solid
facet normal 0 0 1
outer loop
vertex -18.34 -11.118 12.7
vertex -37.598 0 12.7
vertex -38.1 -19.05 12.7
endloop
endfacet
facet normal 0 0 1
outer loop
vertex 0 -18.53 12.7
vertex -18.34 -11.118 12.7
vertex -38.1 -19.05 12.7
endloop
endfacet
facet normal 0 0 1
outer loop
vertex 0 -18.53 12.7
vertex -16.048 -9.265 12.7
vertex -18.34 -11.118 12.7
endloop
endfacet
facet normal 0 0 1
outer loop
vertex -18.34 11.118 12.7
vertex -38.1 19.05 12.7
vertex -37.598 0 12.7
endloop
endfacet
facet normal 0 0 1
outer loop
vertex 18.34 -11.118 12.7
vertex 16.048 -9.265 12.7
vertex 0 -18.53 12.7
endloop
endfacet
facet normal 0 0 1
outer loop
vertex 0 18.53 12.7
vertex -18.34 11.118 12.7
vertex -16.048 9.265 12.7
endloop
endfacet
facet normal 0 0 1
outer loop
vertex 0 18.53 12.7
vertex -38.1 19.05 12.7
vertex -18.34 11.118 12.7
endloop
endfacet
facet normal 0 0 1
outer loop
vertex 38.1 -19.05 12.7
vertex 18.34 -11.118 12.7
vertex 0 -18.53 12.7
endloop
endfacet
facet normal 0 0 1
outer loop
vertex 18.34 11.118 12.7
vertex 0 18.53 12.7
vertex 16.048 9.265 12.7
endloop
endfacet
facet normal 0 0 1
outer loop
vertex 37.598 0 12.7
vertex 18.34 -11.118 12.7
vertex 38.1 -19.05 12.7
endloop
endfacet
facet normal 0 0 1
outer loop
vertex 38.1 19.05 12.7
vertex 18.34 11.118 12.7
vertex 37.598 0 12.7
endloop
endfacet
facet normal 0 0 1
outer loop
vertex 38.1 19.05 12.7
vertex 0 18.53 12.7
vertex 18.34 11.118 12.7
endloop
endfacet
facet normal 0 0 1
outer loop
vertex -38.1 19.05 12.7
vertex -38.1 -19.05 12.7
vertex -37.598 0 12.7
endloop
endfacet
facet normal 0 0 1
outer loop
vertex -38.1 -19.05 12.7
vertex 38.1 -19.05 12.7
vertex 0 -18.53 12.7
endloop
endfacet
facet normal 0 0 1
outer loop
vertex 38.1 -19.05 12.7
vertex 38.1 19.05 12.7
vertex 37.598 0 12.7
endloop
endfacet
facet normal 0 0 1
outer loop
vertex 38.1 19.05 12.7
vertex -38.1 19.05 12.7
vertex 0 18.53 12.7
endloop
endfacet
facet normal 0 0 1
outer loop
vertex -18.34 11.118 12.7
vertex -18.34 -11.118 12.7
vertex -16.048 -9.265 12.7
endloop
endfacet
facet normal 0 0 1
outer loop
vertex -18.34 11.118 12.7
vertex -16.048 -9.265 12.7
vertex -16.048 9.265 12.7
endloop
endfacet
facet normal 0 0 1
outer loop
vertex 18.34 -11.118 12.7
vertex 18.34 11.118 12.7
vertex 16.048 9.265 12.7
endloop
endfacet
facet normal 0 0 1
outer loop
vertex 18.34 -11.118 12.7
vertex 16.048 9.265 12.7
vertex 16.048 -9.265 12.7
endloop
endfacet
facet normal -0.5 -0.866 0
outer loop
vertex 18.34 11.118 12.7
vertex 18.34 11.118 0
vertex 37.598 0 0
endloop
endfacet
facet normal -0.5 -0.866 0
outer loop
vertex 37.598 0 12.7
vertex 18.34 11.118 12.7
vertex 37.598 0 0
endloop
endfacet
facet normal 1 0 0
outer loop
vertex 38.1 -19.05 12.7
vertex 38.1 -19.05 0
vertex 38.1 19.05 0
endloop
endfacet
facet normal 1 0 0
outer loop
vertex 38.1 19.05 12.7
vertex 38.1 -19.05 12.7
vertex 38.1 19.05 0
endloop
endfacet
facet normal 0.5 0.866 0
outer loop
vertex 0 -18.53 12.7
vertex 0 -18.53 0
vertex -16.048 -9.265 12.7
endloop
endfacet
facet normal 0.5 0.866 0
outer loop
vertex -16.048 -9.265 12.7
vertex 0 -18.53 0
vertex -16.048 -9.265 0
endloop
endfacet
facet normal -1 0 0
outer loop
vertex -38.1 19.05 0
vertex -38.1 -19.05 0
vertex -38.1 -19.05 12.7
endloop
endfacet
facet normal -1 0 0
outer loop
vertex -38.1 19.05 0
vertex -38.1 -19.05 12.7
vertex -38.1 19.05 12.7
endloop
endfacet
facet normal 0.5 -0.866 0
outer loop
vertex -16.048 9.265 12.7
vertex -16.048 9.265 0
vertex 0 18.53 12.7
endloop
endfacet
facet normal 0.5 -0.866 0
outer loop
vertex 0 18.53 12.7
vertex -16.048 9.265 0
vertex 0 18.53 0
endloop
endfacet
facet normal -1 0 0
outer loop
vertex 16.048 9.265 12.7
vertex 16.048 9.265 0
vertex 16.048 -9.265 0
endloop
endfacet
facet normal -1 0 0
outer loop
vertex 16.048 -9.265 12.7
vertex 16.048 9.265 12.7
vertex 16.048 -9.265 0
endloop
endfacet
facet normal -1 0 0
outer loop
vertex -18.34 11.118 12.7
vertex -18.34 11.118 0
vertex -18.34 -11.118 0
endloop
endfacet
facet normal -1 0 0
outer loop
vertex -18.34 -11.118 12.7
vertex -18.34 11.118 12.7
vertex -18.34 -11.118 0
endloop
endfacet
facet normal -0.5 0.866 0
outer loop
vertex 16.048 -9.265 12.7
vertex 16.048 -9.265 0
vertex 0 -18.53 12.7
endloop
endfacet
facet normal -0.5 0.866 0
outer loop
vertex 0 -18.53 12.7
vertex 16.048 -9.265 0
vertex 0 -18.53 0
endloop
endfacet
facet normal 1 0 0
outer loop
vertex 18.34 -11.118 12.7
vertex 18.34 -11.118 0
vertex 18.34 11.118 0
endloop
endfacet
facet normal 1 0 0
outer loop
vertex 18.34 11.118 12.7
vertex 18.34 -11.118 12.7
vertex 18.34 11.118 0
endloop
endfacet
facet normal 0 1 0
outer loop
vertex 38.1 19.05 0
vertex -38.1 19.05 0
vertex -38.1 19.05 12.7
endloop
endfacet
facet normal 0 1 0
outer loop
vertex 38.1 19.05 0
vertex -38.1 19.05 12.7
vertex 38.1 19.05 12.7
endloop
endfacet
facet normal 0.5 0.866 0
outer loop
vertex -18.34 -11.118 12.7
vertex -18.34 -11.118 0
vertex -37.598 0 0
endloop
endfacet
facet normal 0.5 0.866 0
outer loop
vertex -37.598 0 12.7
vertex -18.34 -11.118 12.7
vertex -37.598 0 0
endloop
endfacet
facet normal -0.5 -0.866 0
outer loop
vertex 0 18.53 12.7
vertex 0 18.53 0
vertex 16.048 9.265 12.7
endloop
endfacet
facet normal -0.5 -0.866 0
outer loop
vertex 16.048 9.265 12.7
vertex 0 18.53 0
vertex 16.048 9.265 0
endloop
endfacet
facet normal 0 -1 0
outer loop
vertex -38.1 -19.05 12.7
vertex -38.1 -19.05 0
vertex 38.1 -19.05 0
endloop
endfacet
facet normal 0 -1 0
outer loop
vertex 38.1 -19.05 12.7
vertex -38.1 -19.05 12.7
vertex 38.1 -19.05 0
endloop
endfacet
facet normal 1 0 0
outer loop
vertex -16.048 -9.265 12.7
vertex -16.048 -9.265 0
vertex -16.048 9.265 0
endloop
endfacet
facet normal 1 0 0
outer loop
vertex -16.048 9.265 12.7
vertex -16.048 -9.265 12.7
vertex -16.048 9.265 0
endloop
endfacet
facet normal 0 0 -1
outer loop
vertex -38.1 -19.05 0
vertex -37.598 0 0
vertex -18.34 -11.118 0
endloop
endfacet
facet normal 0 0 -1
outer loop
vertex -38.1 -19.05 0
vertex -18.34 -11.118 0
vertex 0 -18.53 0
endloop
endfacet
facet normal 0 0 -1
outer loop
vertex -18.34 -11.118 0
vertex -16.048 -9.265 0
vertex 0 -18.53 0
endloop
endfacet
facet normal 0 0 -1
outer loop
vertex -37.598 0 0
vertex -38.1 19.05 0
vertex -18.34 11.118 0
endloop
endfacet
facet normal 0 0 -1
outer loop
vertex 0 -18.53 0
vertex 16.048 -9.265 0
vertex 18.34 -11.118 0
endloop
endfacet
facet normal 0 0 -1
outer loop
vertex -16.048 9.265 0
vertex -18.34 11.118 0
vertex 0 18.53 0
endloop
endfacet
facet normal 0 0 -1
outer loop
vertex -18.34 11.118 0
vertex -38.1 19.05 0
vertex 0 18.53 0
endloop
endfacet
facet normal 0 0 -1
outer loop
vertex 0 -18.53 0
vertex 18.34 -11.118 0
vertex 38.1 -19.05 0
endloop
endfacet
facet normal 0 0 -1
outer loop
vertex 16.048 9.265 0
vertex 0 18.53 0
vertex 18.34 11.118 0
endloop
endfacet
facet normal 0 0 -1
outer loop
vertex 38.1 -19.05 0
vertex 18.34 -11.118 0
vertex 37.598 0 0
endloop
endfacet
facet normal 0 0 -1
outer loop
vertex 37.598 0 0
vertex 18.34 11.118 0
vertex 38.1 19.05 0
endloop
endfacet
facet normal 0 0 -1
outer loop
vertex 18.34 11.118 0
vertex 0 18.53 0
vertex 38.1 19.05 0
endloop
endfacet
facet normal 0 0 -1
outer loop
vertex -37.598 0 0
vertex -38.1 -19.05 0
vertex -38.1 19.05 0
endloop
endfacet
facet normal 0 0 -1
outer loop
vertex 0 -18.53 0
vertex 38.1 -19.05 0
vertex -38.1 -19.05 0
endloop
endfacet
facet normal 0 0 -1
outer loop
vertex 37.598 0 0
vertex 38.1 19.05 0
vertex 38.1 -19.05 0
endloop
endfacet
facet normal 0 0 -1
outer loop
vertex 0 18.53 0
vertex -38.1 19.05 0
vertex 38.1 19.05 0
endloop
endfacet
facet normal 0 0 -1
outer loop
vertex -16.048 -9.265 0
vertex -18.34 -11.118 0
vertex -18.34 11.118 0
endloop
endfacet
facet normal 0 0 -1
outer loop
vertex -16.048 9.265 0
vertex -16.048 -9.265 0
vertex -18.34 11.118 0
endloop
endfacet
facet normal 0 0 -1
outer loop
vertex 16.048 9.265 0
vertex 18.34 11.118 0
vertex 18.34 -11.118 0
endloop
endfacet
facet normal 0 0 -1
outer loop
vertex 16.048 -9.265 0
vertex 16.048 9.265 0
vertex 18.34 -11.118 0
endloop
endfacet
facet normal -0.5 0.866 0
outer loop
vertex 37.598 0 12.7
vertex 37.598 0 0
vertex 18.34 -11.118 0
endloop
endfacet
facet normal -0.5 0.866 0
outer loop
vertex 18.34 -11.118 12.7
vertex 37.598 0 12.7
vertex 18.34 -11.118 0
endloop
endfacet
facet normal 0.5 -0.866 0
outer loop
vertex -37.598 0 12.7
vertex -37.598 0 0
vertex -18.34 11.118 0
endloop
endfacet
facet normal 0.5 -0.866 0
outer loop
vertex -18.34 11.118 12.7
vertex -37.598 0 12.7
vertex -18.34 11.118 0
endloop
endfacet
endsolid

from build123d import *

# Parameters (mm, degrees)
F0_W     = 76.2
F0_H     = 38.1
F1_DEPTH = 12.7


with BuildPart() as f1:
    # F0 (on Top) → F1 (new body)
    with BuildSketch(Plane.XY):
        Rectangle(F0_W, F0_H)
        Polygon((0, -18.530461), (-16.04785, -9.265231), (-16.04785, 9.265231), (0, 18.530461), (16.04785, 9.265231), (16.04785, -9.265231), align=None, mode=Mode.SUBTRACT)
        Polygon((-37.597824, 0), (-18.340401, 11.118278), (-18.340401, -11.118278), align=None, mode=Mode.SUBTRACT)
        Polygon((37.597822, 0), (18.340405, -11.118275), (18.340405, 11.118275), align=None, mode=Mode.SUBTRACT)
    extrude(amount=F1_DEPTH)


solid = f1.part
